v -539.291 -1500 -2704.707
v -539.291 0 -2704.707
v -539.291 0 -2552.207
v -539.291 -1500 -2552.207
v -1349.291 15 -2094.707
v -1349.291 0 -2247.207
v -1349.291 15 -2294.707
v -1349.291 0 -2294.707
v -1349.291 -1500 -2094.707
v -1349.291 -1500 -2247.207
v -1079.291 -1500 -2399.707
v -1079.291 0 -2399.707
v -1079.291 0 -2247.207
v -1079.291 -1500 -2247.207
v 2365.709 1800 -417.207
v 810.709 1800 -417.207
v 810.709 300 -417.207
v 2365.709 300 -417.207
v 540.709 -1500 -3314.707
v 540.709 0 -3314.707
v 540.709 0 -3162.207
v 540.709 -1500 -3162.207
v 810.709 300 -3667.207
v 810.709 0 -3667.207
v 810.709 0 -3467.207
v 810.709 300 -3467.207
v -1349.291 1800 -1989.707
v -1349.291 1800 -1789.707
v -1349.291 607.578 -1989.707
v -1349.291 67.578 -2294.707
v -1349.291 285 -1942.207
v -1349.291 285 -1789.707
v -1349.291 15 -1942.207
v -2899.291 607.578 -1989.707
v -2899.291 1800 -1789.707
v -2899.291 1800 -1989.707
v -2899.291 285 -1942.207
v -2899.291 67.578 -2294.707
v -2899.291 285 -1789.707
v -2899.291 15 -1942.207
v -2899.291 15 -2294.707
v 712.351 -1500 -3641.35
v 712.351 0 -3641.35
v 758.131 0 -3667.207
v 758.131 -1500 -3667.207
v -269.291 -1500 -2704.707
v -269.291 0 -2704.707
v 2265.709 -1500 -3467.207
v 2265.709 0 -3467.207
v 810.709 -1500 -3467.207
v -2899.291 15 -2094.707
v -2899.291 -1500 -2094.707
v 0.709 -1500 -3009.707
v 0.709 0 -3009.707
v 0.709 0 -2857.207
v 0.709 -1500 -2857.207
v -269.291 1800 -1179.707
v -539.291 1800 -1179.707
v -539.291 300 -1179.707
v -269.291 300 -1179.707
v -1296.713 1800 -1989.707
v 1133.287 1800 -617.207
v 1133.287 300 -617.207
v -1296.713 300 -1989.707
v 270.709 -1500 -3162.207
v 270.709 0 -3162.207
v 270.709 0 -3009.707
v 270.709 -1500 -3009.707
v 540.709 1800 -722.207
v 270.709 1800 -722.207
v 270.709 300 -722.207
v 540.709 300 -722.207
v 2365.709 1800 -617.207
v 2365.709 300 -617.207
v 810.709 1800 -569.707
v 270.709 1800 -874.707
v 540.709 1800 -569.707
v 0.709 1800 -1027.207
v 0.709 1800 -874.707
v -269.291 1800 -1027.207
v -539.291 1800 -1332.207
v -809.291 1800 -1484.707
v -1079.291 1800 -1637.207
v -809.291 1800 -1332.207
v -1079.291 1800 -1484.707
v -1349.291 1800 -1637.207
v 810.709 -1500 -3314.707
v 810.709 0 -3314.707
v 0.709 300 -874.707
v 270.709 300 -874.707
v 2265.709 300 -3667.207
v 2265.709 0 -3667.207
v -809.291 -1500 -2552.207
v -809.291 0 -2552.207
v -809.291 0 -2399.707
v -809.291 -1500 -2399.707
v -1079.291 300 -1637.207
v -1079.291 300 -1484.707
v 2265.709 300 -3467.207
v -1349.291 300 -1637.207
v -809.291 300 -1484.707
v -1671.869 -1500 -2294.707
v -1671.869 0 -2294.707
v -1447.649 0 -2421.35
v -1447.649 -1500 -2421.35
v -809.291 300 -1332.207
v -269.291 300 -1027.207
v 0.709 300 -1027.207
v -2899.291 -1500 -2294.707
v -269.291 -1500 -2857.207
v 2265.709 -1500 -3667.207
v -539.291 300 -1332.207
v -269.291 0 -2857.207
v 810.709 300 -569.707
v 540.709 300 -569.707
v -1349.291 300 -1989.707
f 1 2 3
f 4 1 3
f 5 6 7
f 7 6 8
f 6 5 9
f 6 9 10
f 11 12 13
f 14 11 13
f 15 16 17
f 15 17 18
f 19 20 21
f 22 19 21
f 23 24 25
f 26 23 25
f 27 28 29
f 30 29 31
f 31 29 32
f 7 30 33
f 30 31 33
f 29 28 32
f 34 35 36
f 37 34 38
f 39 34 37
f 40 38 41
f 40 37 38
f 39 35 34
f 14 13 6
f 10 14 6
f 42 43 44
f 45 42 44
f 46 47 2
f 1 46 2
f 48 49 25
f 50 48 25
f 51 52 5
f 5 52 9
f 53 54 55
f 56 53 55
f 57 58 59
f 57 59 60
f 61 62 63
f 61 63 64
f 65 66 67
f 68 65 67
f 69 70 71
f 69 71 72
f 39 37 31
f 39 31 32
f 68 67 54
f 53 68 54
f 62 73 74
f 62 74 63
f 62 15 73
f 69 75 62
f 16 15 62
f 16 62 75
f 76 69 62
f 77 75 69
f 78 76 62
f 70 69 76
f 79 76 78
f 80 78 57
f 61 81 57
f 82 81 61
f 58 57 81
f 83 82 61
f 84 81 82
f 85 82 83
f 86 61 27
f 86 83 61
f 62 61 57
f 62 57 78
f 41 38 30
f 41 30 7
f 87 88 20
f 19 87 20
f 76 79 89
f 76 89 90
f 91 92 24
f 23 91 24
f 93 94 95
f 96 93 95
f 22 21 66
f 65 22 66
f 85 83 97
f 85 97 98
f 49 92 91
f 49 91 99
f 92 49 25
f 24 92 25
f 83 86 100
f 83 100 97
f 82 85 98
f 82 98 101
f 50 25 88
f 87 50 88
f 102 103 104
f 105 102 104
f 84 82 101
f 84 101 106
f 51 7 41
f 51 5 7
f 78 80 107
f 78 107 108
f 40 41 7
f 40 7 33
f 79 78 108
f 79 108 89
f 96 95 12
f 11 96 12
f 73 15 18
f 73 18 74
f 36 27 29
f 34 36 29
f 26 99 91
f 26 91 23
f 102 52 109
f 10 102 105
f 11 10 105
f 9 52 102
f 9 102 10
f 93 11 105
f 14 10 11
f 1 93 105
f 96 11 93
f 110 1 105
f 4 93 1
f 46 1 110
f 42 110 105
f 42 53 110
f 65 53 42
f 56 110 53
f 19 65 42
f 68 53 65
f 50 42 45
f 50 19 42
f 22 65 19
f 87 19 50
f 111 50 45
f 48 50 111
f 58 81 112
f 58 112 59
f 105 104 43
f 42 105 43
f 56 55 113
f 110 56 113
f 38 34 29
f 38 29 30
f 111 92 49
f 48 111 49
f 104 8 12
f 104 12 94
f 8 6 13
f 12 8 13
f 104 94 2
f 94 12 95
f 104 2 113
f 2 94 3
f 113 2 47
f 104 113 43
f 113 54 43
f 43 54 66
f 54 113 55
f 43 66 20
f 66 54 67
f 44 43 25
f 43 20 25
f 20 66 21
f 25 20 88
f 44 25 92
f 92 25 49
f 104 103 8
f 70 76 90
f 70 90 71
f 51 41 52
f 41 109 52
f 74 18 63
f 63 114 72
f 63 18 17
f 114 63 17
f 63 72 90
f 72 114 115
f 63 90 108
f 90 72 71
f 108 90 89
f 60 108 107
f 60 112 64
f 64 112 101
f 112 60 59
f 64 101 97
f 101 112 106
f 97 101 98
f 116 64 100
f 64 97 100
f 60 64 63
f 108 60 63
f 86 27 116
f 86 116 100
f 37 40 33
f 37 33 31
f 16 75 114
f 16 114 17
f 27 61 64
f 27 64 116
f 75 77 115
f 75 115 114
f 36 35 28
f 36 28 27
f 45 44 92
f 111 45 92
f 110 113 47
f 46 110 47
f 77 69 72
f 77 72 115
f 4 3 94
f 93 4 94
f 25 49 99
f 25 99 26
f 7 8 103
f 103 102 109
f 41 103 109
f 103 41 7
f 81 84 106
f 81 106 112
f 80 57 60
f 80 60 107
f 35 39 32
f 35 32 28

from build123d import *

# Parameters (mm, degrees)
F1_DEPTH = 1500
F3_DEPTH = 15
F5_DEPTH = 1550
F7_DEPTH = 1500
F8_W     = 1455
F8_H     = 200
F9_DEPTH = 300


with BuildPart() as f1:
    # F0 (on Front) → F1 (new body)
    with BuildSketch(Plane.XZ):
        Polygon((-1349.291039, -2094.70706), (-2899.291039, -2094.70706), (-2899.291039, -2294.70706), (-1671.869022, -2294.70706), (-1447.649354, -2421.34965), (712.350646, -3641.34965), (758.130978, -3667.20706), (2265.708961, -3667.20706), (2265.708961, -3467.20706), (810.708961, -3467.20706), (810.708961, -3314.70706), (540.708961, -3314.70706), (540.708961, -3162.20706), (270.708961, -3162.20706), (270.708961, -3009.70706), (0.708961, -3009.70706), (0.708961, -2857.20706), (-269.291039, -2857.20706), (-269.291039, -2704.70706), (-539.291039, -2704.70706), (-539.291039, -2552.20706), (-809.291039, -2552.20706), (-809.291039, -2399.70706), (-1079.291039, -2399.70706), (-1079.291039, -2247.20706), (-1349.291039, -2247.20706), align=None)
    extrude(amount=F1_DEPTH)

    # F2 (on face) → F3 (join)
    with BuildSketch(Plane(origin=(0, 0, 0), x_dir=(-1, 0, 0), z_dir=(0, 1, 0))):
        Polygon((1349.291039, -2294.70706), (1671.869022, -2294.70706), (2899.291039, -2294.70706), (2899.291039, -2094.70706), (1349.291039, -2094.70706), (1349.291039, -2247.20706), align=None)
    extrude(amount=F3_DEPTH)


with BuildPart() as f5:
    # F4 (on face) → F5 (new body)
    with BuildSketch(Plane(origin=(-2899.291039, 0, 0), x_dir=(0, -1, 0), z_dir=(-1, 0, 0))):
        Polygon((-15, -2294.70706), (-15, -2094.70706), (-15, -1942.20706), (-285, -1942.20706), (-285, -1789.70706), (-1800, -1789.70706), (-1800, -1989.70706), (-607.577984, -1989.70706), (-67.577984, -2294.70706), align=None)
    extrude(amount=-F5_DEPTH)


with BuildPart() as f7:
    # F6 (on face) → F7 (new body)
    with BuildSketch(Plane(origin=(0, 1800, 0), x_dir=(-1, 0, 0), z_dir=(0, 1, 0))):
        Polygon((1349.291039, -1989.70706), (1349.291039, -1789.70706), (1349.291039, -1637.20706), (1079.291039, -1637.20706), (1079.291039, -1484.70706), (809.291039, -1484.70706), (809.291039, -1332.20706), (539.291039, -1332.20706), (539.291039, -1179.70706), (269.291039, -1179.70706), (269.291039, -1027.20706), (-0.708961, -1027.20706), (-0.708961, -874.70706), (-270.708961, -874.70706), (-270.708961, -722.20706), (-540.708961, -722.20706), (-540.708961, -569.70706), (-810.708961, -569.70706), (-810.708961, -417.20706), (-2365.708961, -417.20706), (-2365.708961, -617.20706), (-1133.286945, -617.20706), (1296.713055, -1989.70706), align=None)
    extrude(amount=-F7_DEPTH)


with BuildPart() as f9:
    # F8 (on face) → F9 (new body)
    with BuildSketch(Plane(origin=(0, 0, 0), x_dir=(-1, 0, 0), z_dir=(0, 1, 0))):
        with Locations((-1538.208961, -3567.20706)):
            Rectangle(F8_W, F8_H)
    extrude(amount=F9_DEPTH)


solid = Compound([f1.part, f5.part, f7.part, f9.part])
